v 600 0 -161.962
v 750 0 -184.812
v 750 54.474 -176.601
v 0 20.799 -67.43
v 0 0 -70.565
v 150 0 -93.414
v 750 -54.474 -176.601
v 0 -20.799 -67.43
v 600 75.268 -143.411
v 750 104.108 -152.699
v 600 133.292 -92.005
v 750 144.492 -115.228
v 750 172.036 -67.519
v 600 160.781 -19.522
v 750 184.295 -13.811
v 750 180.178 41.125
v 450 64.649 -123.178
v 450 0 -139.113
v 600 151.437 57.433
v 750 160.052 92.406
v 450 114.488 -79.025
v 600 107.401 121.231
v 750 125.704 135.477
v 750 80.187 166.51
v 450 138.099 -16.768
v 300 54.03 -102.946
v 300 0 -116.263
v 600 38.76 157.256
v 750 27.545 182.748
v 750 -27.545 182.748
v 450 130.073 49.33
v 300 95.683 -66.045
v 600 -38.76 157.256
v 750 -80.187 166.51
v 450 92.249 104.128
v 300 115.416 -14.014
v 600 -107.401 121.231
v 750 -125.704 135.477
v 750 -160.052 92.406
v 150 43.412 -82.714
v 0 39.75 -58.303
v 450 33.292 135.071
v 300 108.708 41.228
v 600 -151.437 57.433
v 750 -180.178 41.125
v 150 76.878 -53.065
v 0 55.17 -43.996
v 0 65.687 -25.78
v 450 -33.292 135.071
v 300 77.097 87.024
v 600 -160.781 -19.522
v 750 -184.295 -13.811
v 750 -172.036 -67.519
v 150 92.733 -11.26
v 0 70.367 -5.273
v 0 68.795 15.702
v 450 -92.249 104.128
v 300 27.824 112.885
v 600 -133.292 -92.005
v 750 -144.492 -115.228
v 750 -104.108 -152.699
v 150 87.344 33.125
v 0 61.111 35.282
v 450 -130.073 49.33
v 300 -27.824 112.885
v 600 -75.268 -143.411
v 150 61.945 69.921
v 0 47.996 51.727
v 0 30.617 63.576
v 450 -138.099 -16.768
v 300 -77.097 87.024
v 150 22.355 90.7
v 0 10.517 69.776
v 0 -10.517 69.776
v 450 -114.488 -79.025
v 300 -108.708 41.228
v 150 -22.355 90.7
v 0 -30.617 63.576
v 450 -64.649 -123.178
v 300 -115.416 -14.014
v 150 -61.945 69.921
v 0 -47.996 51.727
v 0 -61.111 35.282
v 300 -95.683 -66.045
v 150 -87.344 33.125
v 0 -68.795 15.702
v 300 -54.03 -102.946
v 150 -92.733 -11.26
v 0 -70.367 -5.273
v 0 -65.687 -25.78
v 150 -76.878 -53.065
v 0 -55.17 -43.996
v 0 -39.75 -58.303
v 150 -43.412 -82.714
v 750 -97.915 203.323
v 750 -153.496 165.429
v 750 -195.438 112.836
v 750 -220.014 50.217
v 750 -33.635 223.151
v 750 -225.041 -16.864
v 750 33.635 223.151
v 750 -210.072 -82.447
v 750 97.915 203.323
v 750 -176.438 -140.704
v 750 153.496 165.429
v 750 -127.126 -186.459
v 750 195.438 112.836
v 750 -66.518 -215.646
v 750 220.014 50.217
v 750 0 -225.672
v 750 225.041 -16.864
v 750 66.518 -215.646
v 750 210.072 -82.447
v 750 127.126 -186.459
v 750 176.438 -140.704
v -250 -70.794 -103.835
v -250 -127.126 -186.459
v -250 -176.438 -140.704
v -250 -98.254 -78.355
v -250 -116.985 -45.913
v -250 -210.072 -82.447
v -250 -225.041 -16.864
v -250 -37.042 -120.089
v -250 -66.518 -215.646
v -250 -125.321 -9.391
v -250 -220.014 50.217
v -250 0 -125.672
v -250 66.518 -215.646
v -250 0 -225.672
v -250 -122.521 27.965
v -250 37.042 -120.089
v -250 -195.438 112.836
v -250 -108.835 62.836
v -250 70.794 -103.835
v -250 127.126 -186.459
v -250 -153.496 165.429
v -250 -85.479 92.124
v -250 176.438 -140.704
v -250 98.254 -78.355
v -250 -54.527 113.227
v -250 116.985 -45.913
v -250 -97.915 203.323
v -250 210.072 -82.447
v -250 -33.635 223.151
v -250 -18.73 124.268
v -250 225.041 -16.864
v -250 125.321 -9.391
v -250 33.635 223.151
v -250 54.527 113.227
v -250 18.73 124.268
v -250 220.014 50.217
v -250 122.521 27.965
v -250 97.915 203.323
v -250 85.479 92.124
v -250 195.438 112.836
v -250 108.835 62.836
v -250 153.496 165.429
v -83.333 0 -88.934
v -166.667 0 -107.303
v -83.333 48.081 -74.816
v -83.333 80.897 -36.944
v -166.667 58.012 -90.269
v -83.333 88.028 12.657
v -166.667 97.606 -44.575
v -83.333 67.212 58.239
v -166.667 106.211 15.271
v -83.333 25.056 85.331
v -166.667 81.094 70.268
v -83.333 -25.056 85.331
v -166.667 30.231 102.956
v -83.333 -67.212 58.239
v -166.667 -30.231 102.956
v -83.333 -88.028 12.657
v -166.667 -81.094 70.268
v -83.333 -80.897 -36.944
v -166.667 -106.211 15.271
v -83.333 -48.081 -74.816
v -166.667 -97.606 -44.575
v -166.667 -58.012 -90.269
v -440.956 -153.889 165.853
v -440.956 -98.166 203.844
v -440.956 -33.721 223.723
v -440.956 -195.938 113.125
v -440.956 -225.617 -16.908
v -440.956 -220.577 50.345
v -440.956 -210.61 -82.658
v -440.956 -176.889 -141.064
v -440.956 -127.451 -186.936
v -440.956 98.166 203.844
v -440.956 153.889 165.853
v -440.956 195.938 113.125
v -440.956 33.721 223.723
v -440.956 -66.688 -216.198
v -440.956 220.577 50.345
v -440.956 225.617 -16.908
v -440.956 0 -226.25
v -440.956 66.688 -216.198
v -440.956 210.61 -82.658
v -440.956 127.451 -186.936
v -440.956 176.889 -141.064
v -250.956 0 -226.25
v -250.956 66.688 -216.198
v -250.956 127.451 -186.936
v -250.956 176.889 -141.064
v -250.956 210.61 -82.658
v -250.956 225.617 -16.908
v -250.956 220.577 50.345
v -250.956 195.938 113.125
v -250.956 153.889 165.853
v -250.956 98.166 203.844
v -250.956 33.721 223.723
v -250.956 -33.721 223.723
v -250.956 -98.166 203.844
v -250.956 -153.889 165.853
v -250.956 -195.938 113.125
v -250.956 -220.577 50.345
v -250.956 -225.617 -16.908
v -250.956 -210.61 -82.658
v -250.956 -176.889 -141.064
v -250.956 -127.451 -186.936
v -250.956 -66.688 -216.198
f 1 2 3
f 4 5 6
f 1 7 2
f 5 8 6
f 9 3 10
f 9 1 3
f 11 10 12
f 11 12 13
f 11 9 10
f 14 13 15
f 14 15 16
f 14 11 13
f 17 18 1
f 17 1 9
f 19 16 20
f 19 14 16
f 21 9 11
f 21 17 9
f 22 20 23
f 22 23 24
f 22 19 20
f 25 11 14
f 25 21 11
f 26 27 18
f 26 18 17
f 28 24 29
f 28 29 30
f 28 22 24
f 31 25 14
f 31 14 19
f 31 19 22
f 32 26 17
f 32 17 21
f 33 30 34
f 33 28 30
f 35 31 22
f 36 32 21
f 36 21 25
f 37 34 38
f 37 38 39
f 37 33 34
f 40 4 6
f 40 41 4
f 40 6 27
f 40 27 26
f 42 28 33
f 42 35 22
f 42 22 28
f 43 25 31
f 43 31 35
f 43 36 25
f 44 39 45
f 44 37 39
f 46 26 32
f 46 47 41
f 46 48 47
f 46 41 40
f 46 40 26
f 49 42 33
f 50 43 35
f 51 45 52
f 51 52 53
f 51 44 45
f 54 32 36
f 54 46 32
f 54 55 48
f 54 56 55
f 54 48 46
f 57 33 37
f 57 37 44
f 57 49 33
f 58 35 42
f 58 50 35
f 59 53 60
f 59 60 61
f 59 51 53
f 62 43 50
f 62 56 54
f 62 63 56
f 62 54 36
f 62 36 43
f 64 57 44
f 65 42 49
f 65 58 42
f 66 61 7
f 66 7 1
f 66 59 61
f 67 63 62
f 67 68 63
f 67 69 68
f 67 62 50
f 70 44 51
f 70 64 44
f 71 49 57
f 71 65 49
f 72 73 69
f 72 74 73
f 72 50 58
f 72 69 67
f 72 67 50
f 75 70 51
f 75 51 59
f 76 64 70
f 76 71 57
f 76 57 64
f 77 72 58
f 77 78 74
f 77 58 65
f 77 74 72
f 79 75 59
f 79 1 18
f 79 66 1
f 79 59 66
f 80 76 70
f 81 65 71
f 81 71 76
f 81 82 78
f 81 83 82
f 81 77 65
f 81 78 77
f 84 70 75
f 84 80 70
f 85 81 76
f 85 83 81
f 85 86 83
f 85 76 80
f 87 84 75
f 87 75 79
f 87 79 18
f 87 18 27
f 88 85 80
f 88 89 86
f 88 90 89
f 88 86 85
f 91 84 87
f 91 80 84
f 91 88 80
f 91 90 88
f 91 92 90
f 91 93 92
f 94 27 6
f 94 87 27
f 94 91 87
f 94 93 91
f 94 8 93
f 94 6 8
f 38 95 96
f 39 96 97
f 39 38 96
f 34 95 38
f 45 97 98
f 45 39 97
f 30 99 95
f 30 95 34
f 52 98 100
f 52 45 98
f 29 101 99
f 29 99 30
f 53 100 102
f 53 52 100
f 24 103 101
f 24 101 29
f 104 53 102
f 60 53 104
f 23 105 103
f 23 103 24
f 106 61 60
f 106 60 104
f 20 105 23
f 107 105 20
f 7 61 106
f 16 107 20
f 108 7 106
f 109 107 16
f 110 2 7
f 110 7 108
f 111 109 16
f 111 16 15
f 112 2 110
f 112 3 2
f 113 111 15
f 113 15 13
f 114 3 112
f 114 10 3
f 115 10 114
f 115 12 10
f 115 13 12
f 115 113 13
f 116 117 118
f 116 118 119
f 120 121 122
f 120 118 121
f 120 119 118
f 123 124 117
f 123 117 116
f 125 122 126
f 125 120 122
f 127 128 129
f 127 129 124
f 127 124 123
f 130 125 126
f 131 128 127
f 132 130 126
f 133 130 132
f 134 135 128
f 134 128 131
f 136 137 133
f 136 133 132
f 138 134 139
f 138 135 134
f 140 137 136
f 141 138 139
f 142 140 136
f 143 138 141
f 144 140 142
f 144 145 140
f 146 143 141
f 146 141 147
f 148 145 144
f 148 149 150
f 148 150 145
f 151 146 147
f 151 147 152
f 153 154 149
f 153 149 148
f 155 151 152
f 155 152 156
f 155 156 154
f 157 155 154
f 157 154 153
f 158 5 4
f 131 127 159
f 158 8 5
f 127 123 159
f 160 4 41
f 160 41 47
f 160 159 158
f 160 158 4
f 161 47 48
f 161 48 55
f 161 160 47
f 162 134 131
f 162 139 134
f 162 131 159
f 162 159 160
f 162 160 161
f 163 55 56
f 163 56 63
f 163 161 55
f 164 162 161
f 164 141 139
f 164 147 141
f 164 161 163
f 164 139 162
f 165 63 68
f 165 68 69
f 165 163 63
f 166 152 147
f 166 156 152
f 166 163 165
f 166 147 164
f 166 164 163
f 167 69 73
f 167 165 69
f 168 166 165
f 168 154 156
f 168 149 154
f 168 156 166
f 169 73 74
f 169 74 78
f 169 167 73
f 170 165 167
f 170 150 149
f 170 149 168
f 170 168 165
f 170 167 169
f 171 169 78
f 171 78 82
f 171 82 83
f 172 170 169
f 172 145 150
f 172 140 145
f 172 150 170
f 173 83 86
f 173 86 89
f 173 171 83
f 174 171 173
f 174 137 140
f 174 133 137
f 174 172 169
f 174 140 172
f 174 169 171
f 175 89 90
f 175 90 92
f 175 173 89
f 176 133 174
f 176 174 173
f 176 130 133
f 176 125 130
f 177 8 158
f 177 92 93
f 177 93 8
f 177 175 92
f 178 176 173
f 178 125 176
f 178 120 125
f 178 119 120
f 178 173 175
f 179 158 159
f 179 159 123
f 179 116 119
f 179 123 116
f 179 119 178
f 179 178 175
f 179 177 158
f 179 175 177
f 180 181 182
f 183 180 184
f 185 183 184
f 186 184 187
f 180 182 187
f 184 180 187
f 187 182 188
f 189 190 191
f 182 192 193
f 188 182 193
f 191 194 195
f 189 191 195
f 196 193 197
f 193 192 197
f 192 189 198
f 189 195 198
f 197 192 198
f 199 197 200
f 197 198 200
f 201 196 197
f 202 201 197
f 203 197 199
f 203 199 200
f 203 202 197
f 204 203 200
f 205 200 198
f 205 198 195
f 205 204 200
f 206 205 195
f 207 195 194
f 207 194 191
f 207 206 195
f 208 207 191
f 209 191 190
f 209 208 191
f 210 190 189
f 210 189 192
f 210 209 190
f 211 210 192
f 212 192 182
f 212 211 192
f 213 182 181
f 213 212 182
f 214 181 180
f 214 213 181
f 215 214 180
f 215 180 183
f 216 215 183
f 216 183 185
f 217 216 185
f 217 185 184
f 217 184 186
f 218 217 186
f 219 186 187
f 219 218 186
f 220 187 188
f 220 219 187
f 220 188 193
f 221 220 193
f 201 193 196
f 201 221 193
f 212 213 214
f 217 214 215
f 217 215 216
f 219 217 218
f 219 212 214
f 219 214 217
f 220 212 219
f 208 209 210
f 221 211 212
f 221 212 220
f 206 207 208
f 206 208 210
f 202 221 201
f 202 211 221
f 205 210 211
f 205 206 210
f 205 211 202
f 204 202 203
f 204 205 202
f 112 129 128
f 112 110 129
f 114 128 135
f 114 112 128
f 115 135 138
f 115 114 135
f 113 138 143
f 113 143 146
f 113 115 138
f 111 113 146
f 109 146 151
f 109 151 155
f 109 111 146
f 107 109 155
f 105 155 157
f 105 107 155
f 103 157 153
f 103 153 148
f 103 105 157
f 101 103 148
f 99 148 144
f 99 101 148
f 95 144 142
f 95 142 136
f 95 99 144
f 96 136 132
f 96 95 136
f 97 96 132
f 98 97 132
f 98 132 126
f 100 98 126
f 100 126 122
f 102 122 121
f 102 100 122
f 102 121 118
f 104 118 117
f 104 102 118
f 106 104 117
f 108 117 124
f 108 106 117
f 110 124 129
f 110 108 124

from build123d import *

# Parameters (mm, degrees)
F0_W = 190
F0_H = 226.24976933


with BuildPart() as f1:
    # F0 (on Front) → F1 (revolve)
    with BuildSketch(Plane.XZ):
        Polygon((0, -70.5645144836), (-250.0000075567, -125.6720480688), (-250.0000075567, -225.6720480688), (749.9999924433, -225.6720480688), (749.9999924433, -184.8118322838), align=None)
    revolve(axis=Axis((-3.5921850387, 0, 0), (1, 0, 0)))


with BuildPart() as f2:
    # F0 (on Front) → F2 (revolve)
    with BuildSketch(Plane.XZ):
        with Locations((-345.9563243389, -113.124884665)):
            Rectangle(F0_W, F0_H)
    revolve(axis=Axis((-3.5921850387, 0, 0), (1, 0, 0)))


solid = Compound([f1.part, f2.part])
